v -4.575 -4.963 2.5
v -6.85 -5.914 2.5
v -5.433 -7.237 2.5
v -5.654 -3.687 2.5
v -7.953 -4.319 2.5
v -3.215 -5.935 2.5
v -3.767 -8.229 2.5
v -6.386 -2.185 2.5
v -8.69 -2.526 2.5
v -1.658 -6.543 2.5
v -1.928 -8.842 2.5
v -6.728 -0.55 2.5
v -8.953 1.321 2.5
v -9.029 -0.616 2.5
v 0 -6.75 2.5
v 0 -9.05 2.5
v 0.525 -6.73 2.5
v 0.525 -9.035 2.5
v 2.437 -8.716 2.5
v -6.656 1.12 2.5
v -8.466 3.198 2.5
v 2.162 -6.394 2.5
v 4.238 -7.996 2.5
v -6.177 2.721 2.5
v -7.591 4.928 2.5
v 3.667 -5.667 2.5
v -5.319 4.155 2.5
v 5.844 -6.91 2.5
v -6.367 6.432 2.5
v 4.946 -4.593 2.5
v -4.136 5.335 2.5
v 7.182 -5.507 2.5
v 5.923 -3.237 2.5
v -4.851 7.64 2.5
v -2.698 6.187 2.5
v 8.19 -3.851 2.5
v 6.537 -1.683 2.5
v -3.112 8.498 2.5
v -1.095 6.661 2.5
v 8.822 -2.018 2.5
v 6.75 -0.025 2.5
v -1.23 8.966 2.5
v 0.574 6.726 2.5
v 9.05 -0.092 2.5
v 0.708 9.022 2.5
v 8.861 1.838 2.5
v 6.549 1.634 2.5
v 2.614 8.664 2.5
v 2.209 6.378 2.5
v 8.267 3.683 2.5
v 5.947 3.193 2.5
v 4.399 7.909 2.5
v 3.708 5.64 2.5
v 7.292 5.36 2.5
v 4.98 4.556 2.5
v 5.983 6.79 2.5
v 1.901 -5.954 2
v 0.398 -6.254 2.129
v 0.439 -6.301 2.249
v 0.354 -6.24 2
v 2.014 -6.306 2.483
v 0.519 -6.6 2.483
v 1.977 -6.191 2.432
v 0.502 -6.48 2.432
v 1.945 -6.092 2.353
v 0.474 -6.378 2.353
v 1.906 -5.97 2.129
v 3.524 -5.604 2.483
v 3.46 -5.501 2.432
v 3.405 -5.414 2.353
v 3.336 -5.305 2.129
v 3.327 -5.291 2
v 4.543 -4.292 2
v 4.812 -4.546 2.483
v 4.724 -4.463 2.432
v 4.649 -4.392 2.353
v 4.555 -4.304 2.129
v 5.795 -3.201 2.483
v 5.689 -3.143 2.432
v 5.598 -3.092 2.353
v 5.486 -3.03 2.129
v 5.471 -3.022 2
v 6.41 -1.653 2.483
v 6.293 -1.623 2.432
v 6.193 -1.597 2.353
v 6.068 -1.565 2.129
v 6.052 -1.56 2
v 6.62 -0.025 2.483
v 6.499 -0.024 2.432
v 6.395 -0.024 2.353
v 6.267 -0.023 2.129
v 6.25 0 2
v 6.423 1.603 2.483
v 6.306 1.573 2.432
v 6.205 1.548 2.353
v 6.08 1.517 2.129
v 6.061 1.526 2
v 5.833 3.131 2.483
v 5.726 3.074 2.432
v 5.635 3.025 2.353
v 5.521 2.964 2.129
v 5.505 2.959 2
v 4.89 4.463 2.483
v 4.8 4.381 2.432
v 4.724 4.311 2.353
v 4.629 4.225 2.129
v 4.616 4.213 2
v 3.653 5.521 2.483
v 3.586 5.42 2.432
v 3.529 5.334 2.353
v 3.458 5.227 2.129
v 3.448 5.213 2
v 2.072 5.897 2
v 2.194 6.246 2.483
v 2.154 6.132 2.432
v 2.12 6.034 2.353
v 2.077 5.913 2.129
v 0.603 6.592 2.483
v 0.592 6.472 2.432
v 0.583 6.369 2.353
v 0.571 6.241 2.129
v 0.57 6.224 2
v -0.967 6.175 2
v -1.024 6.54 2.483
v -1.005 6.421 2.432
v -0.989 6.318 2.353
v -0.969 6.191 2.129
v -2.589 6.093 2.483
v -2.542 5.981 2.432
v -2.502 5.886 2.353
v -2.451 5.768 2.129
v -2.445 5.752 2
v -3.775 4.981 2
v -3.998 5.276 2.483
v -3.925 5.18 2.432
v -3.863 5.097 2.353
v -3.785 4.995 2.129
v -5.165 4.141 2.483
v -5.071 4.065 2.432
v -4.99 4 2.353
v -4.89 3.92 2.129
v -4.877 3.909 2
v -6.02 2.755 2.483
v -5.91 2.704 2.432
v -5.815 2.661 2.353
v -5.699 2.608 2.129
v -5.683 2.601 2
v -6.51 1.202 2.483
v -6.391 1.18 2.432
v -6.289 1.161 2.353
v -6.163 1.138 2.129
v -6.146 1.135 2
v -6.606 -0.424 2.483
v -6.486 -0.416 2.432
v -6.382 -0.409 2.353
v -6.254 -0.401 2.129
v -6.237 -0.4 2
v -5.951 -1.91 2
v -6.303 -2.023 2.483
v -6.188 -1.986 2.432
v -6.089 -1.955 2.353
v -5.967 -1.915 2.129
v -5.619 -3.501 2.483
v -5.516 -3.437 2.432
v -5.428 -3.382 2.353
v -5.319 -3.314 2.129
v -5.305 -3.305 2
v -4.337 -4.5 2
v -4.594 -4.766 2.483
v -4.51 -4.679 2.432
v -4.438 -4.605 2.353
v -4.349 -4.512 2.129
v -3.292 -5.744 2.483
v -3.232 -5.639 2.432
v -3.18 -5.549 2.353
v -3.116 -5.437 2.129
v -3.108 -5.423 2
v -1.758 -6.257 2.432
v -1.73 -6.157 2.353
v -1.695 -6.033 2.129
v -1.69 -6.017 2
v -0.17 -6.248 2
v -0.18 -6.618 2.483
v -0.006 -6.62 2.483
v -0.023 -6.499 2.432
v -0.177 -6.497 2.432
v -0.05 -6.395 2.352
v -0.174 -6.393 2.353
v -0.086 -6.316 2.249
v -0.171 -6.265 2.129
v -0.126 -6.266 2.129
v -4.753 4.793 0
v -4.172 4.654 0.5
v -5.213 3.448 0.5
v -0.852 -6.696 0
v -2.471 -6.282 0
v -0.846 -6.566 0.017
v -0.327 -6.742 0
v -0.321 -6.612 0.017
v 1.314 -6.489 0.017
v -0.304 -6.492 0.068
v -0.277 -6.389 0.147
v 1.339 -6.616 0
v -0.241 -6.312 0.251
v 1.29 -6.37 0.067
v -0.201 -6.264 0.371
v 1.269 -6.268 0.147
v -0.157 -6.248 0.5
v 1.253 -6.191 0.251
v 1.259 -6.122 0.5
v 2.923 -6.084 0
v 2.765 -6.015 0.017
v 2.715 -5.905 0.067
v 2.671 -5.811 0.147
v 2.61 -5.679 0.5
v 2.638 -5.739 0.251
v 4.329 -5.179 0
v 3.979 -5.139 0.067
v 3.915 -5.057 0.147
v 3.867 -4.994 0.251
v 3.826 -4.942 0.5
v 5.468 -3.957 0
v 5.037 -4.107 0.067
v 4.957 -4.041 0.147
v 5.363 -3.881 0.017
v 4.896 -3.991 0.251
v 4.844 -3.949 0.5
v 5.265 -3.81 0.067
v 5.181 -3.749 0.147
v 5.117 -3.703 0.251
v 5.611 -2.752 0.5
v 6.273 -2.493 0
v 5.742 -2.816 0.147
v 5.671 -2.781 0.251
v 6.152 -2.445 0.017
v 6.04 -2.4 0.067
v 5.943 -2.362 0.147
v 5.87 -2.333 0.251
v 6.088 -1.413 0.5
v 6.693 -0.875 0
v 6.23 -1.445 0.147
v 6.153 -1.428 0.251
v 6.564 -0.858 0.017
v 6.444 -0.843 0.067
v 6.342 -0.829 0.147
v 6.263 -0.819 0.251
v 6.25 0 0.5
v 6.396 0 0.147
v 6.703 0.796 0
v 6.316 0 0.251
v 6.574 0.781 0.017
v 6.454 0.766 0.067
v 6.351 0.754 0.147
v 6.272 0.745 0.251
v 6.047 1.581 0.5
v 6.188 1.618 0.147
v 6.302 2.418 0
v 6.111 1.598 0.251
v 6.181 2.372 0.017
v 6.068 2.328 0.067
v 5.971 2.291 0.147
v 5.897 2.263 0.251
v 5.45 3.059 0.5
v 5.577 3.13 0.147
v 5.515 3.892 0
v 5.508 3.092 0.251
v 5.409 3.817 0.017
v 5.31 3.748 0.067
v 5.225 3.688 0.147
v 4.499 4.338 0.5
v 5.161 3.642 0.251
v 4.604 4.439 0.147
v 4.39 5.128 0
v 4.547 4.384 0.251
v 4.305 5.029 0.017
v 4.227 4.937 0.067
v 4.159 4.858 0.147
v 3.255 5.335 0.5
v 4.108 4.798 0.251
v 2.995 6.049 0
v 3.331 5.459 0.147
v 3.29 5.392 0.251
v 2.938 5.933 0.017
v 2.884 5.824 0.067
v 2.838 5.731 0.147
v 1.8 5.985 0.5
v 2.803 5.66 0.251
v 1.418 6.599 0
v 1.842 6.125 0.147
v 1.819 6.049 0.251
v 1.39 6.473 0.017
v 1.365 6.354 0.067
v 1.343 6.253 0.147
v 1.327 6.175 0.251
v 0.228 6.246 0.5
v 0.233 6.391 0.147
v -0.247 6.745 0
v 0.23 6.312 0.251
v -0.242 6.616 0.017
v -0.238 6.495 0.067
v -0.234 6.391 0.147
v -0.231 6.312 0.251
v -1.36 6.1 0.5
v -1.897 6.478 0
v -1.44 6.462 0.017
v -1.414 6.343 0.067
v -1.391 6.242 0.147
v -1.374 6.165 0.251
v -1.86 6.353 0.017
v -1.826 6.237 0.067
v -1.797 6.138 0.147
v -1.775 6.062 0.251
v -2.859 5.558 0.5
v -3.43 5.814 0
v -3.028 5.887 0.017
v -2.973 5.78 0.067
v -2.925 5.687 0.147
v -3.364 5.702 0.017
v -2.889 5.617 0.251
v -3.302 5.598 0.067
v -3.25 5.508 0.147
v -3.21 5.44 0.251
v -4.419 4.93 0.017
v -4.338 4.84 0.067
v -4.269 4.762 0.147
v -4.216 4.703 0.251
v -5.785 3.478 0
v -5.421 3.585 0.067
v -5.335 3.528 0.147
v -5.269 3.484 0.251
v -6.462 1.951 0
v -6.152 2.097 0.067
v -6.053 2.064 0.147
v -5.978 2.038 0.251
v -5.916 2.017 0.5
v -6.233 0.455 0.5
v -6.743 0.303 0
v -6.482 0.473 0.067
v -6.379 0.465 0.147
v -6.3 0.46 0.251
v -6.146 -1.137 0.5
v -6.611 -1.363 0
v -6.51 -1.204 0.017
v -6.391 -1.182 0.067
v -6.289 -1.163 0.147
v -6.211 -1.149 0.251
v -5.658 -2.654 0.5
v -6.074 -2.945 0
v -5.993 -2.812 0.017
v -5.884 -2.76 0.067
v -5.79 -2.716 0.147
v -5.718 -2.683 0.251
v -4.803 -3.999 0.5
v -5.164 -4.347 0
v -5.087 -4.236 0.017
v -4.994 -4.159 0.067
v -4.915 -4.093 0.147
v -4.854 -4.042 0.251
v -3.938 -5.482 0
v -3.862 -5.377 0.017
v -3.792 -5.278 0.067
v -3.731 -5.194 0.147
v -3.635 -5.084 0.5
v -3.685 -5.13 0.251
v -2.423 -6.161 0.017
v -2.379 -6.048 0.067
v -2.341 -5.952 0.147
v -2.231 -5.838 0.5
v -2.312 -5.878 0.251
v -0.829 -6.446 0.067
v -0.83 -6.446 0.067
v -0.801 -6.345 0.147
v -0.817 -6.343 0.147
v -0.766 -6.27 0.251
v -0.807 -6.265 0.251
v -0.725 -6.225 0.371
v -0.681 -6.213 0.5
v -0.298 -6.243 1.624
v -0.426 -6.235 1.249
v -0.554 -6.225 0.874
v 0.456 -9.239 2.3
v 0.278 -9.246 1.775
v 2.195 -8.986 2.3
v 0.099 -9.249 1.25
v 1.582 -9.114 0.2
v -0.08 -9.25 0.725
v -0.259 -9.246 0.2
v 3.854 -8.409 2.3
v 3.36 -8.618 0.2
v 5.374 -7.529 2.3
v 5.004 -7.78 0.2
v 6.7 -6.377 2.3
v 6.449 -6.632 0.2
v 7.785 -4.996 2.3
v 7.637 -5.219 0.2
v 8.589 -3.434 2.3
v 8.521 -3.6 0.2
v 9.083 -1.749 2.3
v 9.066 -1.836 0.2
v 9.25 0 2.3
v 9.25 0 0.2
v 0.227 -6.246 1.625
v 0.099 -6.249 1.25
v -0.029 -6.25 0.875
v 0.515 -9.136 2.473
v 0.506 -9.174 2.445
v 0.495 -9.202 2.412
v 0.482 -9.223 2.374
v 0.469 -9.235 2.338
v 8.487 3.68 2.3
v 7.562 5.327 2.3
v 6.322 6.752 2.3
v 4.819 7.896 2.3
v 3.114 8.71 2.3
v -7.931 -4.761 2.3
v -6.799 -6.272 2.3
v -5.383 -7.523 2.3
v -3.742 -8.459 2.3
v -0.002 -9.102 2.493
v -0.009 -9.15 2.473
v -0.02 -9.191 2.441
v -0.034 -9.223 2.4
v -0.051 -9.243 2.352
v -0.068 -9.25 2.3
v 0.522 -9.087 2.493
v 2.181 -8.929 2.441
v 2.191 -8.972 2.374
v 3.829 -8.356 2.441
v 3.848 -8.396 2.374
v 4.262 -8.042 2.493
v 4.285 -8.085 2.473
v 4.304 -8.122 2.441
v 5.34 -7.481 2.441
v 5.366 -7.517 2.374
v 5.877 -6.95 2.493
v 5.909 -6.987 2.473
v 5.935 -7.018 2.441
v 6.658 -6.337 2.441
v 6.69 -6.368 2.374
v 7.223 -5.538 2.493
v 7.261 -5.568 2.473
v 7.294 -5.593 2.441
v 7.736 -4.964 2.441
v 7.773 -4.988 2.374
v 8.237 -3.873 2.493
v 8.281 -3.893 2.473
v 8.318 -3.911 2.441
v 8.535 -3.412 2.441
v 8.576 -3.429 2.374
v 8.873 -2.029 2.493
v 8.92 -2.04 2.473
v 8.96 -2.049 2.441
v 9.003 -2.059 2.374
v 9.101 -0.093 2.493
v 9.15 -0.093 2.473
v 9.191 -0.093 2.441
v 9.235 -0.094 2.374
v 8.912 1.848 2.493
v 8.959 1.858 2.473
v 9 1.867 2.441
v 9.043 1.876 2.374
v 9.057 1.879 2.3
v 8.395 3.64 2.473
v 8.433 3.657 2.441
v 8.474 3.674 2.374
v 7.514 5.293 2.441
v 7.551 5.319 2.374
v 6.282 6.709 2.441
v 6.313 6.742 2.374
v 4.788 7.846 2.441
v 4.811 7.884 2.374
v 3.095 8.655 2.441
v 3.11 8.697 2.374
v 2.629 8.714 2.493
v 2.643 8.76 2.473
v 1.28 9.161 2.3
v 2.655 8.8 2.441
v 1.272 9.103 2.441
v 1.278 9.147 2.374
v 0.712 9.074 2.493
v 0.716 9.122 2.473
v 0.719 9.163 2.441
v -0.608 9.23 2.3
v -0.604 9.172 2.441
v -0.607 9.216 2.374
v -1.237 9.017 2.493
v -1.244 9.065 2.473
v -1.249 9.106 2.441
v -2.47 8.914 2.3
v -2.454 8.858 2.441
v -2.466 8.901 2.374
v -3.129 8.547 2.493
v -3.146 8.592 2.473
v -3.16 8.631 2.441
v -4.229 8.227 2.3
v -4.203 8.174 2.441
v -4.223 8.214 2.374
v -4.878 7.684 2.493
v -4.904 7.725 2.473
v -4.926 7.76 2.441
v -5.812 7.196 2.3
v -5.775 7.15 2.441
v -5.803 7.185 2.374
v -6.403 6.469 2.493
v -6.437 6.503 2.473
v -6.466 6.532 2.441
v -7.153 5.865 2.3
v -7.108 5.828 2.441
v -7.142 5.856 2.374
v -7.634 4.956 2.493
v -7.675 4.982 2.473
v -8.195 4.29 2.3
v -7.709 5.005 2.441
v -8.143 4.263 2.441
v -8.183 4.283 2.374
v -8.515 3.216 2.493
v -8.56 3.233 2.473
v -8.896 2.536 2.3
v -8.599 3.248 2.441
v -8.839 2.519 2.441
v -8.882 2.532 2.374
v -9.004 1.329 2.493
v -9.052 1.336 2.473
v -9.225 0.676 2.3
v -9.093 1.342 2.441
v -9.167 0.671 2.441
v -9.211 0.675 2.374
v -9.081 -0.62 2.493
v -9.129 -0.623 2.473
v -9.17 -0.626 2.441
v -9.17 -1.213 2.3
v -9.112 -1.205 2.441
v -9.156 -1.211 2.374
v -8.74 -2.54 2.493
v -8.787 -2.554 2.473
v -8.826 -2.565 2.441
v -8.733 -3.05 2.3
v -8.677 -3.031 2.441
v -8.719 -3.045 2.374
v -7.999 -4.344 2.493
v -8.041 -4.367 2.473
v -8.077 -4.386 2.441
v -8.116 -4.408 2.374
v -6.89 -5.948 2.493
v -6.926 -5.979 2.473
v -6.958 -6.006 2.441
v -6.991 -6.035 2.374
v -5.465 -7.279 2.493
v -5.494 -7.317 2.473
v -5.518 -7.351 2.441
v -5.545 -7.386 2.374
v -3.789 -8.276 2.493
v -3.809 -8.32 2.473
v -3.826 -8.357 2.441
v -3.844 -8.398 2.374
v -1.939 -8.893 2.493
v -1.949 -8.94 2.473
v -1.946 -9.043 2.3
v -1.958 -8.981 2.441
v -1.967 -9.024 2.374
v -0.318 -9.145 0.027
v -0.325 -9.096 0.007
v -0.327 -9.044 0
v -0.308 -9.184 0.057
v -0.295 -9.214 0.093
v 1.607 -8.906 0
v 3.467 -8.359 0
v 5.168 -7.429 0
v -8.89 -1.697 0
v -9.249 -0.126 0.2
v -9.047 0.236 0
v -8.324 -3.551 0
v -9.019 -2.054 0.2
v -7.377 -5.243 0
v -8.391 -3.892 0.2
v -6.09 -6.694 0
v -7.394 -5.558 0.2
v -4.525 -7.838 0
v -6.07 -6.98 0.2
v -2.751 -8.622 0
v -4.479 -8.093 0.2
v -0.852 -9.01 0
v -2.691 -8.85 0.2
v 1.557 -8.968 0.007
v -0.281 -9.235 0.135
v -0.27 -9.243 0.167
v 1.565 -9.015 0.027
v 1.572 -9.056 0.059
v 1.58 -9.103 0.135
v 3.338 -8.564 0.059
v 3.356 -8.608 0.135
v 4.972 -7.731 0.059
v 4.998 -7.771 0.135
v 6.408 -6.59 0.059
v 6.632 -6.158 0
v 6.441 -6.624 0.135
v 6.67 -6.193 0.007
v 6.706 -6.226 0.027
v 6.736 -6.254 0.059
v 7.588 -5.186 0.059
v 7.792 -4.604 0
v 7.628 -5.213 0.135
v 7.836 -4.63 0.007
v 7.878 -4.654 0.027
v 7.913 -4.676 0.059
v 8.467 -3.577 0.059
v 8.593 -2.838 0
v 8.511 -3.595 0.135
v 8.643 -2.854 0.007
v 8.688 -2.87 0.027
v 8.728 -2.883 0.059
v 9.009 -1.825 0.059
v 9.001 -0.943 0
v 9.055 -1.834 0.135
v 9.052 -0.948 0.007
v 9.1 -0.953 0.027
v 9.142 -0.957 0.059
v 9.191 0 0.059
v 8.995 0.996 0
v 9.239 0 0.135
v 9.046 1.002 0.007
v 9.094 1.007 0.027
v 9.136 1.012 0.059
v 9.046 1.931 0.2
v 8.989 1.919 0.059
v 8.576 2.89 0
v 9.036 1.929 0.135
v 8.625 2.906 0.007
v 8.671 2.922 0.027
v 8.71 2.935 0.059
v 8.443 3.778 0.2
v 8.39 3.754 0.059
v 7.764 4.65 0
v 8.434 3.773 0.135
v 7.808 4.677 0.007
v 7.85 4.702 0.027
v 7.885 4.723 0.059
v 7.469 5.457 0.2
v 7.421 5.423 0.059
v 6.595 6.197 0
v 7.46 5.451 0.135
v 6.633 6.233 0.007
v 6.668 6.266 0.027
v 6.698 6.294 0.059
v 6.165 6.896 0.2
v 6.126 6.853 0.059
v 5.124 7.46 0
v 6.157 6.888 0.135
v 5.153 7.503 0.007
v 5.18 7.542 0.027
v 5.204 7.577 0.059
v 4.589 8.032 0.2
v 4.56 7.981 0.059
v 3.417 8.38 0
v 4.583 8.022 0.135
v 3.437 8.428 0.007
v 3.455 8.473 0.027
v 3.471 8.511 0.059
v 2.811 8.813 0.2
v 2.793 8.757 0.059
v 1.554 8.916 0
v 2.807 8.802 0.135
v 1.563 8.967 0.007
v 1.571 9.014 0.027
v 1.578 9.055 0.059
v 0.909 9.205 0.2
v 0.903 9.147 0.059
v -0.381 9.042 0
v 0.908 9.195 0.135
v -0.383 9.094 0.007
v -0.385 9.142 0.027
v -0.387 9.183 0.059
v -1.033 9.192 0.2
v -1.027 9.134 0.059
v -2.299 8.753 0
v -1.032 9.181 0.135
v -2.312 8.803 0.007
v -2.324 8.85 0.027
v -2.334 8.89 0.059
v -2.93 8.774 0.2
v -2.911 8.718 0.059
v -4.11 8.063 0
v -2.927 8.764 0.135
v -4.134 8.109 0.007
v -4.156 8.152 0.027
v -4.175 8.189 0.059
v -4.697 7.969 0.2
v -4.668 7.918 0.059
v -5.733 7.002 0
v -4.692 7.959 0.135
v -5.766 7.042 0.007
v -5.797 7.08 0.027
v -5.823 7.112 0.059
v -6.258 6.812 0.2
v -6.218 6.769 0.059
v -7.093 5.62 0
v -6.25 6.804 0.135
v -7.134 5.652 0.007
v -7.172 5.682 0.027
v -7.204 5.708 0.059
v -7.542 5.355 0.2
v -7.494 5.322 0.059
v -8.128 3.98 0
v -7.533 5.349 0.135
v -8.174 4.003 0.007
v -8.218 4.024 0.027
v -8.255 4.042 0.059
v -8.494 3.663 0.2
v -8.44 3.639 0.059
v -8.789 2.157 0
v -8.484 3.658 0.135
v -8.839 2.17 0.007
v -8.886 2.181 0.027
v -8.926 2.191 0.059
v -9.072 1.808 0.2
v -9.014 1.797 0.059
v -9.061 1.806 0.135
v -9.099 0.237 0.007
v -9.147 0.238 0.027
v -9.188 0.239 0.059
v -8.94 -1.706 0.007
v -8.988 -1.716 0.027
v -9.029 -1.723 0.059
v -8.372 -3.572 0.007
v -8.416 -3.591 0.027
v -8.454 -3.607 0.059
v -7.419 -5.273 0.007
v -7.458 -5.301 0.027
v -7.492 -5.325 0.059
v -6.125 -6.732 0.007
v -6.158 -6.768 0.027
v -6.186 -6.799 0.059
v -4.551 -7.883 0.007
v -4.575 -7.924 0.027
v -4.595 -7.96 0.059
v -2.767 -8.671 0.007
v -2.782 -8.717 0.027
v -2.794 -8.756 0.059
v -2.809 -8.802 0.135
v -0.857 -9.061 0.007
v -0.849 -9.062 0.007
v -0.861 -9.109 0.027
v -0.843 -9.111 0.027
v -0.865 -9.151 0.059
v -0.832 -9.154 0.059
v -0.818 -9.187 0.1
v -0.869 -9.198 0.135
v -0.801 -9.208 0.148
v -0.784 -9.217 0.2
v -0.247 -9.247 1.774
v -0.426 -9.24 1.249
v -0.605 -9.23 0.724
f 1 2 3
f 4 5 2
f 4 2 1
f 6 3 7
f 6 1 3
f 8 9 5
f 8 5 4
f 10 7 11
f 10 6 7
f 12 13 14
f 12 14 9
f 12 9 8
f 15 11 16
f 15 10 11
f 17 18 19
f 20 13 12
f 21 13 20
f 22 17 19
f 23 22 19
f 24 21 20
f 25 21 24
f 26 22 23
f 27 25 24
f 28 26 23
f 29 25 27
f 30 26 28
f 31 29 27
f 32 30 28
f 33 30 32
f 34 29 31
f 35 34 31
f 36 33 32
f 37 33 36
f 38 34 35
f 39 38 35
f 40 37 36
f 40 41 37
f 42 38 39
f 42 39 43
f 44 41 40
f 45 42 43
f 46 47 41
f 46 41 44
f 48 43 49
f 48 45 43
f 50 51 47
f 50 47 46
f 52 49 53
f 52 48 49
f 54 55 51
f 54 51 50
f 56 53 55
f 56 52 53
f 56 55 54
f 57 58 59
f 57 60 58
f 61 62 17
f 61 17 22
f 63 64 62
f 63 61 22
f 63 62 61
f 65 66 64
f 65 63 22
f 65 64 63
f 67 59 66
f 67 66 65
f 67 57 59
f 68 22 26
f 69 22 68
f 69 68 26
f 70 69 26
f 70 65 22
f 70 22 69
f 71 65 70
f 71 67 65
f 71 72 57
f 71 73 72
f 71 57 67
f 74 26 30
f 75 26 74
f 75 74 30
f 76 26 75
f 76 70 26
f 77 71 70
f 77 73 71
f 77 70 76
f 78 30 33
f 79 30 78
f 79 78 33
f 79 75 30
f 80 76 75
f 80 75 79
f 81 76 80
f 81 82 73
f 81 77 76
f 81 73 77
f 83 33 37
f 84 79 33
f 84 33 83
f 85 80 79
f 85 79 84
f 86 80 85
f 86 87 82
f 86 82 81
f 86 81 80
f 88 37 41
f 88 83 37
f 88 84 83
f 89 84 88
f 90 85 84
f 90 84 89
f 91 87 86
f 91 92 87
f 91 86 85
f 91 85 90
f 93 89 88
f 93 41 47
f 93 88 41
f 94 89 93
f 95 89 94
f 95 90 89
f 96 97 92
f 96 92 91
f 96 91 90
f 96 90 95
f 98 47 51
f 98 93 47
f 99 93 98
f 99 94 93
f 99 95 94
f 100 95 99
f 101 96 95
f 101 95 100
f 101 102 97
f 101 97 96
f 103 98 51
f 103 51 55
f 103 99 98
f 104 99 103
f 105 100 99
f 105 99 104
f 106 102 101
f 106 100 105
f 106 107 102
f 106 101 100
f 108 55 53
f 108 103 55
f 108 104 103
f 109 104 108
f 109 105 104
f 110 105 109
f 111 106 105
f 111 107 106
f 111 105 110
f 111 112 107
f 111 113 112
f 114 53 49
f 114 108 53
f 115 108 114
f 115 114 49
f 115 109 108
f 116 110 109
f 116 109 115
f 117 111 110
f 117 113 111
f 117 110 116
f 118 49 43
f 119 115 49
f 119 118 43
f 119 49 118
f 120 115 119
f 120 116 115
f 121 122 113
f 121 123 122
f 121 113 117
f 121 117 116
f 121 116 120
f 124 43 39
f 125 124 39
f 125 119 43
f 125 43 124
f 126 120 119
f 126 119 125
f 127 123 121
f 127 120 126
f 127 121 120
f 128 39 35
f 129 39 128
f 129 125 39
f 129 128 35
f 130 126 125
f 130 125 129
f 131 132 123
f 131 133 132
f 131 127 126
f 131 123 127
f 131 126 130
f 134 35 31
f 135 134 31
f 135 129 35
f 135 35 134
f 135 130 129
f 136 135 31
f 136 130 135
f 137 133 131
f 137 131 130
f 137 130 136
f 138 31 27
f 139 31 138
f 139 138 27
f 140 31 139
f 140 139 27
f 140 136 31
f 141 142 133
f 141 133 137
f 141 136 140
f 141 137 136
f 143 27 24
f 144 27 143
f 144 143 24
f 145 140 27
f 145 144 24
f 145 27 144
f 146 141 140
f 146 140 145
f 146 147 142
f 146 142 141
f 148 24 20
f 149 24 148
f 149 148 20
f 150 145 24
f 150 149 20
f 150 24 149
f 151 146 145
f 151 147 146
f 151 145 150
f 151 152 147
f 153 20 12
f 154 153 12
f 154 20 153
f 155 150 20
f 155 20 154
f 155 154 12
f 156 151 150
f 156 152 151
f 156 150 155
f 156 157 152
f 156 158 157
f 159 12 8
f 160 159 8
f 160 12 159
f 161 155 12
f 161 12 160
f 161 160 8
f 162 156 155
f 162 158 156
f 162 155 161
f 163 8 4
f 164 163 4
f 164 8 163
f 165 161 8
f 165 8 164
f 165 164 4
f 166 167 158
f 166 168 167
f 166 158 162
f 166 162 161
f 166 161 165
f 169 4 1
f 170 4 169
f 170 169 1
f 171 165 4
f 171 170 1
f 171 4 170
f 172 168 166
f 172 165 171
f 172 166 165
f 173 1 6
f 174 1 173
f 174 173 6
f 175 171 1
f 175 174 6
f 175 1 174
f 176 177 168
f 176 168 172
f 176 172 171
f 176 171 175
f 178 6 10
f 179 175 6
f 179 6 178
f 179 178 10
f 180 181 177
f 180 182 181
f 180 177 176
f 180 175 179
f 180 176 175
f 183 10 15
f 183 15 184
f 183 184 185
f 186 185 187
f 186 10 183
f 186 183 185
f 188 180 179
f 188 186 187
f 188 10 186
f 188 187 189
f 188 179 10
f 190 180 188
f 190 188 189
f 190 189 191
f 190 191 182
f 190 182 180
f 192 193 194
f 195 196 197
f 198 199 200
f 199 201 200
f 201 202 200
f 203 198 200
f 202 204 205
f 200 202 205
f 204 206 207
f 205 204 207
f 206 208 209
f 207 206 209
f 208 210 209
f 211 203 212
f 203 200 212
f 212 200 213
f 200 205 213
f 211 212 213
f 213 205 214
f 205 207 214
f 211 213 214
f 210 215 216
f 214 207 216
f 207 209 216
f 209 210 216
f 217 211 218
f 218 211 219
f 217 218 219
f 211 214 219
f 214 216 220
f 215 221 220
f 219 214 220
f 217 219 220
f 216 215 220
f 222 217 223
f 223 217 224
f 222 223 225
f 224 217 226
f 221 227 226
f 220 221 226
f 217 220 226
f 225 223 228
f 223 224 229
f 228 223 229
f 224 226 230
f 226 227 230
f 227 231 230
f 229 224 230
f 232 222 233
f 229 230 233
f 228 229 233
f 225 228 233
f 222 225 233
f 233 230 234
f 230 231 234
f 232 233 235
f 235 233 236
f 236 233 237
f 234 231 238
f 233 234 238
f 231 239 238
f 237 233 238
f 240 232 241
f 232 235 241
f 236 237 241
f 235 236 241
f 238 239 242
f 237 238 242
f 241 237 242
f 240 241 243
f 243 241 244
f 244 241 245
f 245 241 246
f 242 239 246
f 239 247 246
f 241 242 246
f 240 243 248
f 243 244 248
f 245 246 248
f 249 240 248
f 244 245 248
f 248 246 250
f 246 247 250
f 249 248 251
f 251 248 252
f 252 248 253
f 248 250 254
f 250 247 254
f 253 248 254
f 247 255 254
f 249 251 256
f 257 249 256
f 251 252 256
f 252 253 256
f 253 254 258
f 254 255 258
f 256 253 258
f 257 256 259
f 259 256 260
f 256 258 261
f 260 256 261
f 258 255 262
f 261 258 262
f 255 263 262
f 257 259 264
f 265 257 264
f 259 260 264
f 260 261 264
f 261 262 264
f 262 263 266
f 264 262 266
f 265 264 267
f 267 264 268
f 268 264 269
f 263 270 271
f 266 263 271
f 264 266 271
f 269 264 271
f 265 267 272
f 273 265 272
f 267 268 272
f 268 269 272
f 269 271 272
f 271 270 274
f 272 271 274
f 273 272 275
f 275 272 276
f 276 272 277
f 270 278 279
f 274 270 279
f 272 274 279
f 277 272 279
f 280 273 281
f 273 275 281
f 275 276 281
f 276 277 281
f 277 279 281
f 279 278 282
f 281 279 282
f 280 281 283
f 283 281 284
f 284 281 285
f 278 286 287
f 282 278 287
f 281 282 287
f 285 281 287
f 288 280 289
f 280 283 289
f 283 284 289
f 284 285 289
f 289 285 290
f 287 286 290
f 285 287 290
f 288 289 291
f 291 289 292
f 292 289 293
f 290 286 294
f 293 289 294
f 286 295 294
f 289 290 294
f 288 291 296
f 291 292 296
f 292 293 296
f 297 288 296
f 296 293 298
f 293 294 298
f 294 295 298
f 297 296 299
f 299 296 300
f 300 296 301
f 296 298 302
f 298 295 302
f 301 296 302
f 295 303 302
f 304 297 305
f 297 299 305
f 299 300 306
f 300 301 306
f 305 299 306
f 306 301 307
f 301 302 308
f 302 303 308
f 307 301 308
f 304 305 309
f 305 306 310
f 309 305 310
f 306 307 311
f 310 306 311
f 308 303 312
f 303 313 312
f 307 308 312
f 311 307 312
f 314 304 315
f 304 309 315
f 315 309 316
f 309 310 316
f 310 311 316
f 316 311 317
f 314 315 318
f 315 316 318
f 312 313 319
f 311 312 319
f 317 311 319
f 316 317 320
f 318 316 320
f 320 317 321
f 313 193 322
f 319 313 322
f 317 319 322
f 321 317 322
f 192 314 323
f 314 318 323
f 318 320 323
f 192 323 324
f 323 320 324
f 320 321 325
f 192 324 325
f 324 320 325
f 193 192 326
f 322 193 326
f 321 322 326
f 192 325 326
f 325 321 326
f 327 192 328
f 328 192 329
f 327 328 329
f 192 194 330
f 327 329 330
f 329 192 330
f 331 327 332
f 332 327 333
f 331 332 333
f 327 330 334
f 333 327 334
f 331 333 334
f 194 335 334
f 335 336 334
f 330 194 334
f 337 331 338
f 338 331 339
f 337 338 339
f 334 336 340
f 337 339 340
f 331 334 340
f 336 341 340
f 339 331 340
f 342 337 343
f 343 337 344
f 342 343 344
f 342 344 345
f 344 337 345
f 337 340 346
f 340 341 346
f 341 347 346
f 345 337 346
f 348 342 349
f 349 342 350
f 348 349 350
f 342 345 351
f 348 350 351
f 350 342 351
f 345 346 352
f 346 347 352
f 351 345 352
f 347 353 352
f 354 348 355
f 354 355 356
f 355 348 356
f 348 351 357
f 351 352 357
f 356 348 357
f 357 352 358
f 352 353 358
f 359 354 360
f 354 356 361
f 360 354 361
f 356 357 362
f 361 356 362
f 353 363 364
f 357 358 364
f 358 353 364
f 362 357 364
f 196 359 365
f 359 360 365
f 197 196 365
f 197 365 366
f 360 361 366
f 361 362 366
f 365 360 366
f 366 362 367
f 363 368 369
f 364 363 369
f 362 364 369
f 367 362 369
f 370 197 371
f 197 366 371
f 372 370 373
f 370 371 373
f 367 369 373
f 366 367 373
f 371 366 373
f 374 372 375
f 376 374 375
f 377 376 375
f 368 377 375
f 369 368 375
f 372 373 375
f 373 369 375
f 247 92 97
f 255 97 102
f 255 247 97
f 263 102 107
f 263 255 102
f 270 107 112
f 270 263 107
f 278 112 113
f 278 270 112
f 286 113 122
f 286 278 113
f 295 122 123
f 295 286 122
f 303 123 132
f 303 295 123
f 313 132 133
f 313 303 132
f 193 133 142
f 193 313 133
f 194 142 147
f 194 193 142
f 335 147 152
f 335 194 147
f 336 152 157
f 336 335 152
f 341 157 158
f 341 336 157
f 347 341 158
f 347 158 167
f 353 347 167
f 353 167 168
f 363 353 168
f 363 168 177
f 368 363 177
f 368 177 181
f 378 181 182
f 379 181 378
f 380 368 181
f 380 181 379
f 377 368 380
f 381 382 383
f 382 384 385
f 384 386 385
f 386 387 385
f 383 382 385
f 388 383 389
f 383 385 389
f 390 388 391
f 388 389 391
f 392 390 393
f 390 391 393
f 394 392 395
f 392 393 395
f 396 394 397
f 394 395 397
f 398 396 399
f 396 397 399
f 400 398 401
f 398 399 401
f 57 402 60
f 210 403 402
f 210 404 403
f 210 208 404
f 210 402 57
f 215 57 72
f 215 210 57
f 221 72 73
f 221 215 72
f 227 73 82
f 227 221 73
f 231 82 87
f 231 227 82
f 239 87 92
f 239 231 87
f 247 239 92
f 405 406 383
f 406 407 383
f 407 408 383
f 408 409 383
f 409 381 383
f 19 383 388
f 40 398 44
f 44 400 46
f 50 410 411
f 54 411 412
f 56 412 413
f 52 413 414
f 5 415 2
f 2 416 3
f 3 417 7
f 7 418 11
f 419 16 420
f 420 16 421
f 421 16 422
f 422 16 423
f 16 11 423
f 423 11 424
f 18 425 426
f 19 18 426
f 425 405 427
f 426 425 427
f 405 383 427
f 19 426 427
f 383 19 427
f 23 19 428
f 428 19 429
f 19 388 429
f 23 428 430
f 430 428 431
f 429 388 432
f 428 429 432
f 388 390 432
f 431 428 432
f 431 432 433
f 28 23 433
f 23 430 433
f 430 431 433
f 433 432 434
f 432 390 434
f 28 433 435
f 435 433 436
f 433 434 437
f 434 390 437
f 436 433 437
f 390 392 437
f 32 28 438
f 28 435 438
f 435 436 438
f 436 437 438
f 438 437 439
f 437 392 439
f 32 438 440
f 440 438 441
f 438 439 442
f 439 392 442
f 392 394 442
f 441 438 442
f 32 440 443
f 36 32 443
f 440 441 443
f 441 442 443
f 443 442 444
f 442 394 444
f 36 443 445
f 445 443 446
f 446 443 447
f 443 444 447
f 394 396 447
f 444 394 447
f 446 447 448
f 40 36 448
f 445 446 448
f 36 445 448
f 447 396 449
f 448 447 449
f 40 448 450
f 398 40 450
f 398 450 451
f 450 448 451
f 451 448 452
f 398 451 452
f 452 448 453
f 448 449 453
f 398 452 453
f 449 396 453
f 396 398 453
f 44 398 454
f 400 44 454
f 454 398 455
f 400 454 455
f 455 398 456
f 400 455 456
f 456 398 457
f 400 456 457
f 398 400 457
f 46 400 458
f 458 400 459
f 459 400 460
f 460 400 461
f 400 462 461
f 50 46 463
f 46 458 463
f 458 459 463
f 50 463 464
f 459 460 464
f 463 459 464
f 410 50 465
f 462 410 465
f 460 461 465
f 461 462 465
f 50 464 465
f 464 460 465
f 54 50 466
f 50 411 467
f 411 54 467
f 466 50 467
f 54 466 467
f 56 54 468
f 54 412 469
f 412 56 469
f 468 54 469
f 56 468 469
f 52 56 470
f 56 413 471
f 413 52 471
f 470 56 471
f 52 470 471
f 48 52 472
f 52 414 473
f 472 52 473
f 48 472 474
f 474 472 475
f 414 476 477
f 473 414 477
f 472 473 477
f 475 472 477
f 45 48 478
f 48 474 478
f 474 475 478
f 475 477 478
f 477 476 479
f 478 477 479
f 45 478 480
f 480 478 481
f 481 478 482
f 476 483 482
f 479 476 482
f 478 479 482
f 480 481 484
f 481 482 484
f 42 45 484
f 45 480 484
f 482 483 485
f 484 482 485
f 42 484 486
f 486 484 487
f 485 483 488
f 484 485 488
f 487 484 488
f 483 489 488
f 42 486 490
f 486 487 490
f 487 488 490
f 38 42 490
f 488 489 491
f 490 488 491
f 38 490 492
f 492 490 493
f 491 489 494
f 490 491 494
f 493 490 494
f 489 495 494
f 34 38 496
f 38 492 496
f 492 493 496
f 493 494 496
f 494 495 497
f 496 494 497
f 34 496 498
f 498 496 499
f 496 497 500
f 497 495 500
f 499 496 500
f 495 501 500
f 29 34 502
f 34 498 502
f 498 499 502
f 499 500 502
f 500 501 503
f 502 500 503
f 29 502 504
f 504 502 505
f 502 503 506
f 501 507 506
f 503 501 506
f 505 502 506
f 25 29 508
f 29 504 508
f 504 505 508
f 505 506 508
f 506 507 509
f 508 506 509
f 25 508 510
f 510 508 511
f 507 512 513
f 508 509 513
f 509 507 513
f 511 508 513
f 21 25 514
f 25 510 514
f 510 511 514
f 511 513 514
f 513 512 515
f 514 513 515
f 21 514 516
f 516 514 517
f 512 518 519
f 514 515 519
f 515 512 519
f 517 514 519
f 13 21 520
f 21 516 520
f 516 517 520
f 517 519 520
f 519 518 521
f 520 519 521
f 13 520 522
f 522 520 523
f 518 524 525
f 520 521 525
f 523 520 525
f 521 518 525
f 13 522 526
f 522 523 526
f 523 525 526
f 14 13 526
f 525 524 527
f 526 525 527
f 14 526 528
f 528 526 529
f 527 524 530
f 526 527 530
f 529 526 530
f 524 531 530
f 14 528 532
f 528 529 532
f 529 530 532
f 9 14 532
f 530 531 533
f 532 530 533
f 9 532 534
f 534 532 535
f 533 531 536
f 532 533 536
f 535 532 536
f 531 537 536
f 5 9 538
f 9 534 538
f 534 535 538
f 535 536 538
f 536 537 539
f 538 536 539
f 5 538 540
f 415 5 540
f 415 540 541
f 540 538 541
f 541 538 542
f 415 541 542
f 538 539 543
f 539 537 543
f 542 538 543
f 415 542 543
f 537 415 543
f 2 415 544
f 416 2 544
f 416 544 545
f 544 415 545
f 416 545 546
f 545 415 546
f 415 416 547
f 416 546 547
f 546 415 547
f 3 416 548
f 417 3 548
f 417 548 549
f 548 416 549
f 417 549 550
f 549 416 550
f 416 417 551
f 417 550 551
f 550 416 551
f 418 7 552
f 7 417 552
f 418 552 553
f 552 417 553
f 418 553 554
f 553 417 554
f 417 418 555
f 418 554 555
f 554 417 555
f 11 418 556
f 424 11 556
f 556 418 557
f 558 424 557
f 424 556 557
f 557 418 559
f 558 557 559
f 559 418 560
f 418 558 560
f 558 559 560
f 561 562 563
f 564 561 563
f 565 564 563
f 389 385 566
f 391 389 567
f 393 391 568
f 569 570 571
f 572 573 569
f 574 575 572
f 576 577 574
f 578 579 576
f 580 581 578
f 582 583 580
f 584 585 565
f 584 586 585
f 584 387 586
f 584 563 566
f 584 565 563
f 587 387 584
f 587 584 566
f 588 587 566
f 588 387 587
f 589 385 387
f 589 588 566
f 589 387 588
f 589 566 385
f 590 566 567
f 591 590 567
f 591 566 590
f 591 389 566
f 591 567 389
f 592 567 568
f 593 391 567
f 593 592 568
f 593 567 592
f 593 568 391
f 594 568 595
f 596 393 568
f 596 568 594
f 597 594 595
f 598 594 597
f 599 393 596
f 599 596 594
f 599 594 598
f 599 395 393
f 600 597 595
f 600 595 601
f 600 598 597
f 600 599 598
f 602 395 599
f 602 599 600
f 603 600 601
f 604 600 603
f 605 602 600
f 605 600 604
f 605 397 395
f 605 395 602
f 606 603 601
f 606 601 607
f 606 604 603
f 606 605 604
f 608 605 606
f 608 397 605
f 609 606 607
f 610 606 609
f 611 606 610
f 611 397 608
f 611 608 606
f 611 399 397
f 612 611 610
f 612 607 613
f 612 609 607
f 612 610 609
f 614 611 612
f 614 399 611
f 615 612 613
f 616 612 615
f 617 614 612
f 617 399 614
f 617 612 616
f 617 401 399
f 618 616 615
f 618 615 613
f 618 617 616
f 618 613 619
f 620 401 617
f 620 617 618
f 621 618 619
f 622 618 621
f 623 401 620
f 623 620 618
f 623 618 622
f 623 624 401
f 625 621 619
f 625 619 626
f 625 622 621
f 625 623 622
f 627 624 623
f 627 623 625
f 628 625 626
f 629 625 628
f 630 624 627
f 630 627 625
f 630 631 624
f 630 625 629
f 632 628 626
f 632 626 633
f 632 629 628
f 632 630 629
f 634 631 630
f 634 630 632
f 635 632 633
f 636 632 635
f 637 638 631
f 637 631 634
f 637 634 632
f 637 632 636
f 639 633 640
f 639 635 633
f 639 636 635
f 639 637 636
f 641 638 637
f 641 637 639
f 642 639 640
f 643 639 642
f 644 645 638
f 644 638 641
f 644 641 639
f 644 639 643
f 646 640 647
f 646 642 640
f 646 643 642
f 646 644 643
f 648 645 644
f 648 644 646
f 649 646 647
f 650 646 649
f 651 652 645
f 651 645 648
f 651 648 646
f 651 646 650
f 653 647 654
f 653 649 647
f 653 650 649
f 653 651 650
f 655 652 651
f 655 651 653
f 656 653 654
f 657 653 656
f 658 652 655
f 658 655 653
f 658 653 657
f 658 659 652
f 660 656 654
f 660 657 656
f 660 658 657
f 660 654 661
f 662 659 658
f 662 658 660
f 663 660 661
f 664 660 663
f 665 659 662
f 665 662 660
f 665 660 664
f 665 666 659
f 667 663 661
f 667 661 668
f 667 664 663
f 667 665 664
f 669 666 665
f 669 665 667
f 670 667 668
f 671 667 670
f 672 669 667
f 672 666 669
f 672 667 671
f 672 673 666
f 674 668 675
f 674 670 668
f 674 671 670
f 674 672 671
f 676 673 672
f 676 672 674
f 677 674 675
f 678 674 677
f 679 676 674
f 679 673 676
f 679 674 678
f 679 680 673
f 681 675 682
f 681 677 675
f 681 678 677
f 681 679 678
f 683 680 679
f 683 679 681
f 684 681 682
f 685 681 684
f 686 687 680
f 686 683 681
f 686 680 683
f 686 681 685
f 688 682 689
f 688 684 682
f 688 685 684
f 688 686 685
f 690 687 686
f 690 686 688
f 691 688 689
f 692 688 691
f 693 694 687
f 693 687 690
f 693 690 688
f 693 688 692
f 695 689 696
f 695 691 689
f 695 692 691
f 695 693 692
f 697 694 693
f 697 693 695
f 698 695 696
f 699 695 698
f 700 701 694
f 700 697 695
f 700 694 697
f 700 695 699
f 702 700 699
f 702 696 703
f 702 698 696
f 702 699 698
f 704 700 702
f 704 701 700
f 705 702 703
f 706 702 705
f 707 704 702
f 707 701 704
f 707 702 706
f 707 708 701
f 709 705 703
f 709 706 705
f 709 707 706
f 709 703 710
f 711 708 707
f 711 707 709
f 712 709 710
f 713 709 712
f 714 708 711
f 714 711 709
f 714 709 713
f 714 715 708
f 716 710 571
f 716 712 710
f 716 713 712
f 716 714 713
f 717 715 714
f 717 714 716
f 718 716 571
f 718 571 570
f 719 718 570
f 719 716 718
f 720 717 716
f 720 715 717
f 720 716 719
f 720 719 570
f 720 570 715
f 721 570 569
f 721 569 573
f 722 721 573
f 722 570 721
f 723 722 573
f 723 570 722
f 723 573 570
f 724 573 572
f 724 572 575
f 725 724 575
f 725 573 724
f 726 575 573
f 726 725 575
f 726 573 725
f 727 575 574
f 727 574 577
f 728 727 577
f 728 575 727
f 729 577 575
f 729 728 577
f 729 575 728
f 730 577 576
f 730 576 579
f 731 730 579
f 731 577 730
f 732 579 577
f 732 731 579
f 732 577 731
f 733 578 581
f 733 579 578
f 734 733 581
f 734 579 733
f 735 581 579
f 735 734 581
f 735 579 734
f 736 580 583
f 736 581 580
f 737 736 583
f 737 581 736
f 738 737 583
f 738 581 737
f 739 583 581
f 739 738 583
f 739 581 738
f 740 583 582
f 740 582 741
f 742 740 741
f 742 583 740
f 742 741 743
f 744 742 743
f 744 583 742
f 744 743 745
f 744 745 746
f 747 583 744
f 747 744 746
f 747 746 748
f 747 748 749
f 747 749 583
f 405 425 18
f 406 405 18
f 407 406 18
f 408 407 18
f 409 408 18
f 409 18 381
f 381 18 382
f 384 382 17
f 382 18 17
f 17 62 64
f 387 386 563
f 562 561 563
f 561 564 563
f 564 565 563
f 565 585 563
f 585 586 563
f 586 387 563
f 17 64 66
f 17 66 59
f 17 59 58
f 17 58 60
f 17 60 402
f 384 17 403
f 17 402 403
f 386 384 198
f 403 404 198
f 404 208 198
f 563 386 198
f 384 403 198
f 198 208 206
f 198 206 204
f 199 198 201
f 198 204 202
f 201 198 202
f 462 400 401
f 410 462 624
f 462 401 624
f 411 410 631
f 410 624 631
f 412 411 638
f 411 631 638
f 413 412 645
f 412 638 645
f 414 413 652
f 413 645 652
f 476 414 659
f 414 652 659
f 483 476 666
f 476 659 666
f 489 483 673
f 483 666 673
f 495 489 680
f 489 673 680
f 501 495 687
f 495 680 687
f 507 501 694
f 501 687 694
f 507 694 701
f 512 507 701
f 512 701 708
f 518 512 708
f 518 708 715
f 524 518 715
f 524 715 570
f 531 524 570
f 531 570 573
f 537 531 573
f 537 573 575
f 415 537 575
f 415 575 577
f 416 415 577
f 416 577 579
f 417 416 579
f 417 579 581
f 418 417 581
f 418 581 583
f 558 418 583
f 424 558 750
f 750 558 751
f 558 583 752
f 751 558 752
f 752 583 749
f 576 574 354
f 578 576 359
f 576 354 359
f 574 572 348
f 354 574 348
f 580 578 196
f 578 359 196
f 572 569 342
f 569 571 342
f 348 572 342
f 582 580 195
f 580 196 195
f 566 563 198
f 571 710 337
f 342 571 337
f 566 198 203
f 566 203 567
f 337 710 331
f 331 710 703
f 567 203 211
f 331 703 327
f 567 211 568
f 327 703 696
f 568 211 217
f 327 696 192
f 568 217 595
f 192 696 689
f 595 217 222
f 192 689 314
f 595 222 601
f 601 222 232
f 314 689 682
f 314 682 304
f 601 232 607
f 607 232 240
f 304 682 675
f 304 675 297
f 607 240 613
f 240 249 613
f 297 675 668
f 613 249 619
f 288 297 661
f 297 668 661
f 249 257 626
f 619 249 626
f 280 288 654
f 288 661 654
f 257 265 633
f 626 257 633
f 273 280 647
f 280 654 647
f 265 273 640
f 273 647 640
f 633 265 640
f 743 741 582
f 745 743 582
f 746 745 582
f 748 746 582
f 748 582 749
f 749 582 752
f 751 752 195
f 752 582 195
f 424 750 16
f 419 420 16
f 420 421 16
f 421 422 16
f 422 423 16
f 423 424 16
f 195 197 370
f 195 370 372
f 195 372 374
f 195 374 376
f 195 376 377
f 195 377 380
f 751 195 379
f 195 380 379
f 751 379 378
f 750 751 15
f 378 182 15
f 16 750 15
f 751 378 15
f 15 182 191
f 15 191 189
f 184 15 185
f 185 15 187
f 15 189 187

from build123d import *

# Parameters (mm, degrees)
ESQUISSE1_R             = 9.25
ESQUISSE1_R_2           = 6.25
EXTRUSION1_DEPTH        = 2.5
ENL_V_MAT_EXTRU_1_DEPTH = 14.318220602
CONG_1_R                = 0.5
CONG_2_R                = 0.2


with BuildPart() as part:
    # Esquisse1 → Extrusion1 (new body)
    with BuildSketch(Plane.XY):
        Circle(ESQUISSE1_R)
        Circle(ESQUISSE1_R_2, mode=Mode.SUBTRACT)
    extrude(amount=EXTRUSION1_DEPTH)

    # Esquisse2 → Enlèv. mat.-Extru.1 (cut, through all)
    with BuildSketch(Plane(origin=(0, 0, 0), x_dir=(1, 0, 0), z_dir=(0, 1, 0))):
        Polygon((-0.851663401, 0), (0, -2.5), (0.524617445, -2.5), (-0.327045957, 0), align=None)
    extrude(amount=-ENL_V_MAT_EXTRU_1_DEPTH, mode=Mode.SUBTRACT)

    # Congé1
    cong_1_edges = [part.edges().sort_by_distance(p)[0] for p in [
        (-4.419417382, 4.419417382, 2.5),
        (-4.107286436, 4.710912664, 0),
    ]]
    fillet(cong_1_edges, radius=CONG_1_R)

    # Congé2
    cong_2_edges = [part.edges().sort_by_distance(p)[0] for p in [
        (-6.540737726, 6.540737726, 2.5),
        (-6.232359647, 6.835217131, 0),
    ]]
    fillet(cong_2_edges, radius=CONG_2_R)


solid = part.part
